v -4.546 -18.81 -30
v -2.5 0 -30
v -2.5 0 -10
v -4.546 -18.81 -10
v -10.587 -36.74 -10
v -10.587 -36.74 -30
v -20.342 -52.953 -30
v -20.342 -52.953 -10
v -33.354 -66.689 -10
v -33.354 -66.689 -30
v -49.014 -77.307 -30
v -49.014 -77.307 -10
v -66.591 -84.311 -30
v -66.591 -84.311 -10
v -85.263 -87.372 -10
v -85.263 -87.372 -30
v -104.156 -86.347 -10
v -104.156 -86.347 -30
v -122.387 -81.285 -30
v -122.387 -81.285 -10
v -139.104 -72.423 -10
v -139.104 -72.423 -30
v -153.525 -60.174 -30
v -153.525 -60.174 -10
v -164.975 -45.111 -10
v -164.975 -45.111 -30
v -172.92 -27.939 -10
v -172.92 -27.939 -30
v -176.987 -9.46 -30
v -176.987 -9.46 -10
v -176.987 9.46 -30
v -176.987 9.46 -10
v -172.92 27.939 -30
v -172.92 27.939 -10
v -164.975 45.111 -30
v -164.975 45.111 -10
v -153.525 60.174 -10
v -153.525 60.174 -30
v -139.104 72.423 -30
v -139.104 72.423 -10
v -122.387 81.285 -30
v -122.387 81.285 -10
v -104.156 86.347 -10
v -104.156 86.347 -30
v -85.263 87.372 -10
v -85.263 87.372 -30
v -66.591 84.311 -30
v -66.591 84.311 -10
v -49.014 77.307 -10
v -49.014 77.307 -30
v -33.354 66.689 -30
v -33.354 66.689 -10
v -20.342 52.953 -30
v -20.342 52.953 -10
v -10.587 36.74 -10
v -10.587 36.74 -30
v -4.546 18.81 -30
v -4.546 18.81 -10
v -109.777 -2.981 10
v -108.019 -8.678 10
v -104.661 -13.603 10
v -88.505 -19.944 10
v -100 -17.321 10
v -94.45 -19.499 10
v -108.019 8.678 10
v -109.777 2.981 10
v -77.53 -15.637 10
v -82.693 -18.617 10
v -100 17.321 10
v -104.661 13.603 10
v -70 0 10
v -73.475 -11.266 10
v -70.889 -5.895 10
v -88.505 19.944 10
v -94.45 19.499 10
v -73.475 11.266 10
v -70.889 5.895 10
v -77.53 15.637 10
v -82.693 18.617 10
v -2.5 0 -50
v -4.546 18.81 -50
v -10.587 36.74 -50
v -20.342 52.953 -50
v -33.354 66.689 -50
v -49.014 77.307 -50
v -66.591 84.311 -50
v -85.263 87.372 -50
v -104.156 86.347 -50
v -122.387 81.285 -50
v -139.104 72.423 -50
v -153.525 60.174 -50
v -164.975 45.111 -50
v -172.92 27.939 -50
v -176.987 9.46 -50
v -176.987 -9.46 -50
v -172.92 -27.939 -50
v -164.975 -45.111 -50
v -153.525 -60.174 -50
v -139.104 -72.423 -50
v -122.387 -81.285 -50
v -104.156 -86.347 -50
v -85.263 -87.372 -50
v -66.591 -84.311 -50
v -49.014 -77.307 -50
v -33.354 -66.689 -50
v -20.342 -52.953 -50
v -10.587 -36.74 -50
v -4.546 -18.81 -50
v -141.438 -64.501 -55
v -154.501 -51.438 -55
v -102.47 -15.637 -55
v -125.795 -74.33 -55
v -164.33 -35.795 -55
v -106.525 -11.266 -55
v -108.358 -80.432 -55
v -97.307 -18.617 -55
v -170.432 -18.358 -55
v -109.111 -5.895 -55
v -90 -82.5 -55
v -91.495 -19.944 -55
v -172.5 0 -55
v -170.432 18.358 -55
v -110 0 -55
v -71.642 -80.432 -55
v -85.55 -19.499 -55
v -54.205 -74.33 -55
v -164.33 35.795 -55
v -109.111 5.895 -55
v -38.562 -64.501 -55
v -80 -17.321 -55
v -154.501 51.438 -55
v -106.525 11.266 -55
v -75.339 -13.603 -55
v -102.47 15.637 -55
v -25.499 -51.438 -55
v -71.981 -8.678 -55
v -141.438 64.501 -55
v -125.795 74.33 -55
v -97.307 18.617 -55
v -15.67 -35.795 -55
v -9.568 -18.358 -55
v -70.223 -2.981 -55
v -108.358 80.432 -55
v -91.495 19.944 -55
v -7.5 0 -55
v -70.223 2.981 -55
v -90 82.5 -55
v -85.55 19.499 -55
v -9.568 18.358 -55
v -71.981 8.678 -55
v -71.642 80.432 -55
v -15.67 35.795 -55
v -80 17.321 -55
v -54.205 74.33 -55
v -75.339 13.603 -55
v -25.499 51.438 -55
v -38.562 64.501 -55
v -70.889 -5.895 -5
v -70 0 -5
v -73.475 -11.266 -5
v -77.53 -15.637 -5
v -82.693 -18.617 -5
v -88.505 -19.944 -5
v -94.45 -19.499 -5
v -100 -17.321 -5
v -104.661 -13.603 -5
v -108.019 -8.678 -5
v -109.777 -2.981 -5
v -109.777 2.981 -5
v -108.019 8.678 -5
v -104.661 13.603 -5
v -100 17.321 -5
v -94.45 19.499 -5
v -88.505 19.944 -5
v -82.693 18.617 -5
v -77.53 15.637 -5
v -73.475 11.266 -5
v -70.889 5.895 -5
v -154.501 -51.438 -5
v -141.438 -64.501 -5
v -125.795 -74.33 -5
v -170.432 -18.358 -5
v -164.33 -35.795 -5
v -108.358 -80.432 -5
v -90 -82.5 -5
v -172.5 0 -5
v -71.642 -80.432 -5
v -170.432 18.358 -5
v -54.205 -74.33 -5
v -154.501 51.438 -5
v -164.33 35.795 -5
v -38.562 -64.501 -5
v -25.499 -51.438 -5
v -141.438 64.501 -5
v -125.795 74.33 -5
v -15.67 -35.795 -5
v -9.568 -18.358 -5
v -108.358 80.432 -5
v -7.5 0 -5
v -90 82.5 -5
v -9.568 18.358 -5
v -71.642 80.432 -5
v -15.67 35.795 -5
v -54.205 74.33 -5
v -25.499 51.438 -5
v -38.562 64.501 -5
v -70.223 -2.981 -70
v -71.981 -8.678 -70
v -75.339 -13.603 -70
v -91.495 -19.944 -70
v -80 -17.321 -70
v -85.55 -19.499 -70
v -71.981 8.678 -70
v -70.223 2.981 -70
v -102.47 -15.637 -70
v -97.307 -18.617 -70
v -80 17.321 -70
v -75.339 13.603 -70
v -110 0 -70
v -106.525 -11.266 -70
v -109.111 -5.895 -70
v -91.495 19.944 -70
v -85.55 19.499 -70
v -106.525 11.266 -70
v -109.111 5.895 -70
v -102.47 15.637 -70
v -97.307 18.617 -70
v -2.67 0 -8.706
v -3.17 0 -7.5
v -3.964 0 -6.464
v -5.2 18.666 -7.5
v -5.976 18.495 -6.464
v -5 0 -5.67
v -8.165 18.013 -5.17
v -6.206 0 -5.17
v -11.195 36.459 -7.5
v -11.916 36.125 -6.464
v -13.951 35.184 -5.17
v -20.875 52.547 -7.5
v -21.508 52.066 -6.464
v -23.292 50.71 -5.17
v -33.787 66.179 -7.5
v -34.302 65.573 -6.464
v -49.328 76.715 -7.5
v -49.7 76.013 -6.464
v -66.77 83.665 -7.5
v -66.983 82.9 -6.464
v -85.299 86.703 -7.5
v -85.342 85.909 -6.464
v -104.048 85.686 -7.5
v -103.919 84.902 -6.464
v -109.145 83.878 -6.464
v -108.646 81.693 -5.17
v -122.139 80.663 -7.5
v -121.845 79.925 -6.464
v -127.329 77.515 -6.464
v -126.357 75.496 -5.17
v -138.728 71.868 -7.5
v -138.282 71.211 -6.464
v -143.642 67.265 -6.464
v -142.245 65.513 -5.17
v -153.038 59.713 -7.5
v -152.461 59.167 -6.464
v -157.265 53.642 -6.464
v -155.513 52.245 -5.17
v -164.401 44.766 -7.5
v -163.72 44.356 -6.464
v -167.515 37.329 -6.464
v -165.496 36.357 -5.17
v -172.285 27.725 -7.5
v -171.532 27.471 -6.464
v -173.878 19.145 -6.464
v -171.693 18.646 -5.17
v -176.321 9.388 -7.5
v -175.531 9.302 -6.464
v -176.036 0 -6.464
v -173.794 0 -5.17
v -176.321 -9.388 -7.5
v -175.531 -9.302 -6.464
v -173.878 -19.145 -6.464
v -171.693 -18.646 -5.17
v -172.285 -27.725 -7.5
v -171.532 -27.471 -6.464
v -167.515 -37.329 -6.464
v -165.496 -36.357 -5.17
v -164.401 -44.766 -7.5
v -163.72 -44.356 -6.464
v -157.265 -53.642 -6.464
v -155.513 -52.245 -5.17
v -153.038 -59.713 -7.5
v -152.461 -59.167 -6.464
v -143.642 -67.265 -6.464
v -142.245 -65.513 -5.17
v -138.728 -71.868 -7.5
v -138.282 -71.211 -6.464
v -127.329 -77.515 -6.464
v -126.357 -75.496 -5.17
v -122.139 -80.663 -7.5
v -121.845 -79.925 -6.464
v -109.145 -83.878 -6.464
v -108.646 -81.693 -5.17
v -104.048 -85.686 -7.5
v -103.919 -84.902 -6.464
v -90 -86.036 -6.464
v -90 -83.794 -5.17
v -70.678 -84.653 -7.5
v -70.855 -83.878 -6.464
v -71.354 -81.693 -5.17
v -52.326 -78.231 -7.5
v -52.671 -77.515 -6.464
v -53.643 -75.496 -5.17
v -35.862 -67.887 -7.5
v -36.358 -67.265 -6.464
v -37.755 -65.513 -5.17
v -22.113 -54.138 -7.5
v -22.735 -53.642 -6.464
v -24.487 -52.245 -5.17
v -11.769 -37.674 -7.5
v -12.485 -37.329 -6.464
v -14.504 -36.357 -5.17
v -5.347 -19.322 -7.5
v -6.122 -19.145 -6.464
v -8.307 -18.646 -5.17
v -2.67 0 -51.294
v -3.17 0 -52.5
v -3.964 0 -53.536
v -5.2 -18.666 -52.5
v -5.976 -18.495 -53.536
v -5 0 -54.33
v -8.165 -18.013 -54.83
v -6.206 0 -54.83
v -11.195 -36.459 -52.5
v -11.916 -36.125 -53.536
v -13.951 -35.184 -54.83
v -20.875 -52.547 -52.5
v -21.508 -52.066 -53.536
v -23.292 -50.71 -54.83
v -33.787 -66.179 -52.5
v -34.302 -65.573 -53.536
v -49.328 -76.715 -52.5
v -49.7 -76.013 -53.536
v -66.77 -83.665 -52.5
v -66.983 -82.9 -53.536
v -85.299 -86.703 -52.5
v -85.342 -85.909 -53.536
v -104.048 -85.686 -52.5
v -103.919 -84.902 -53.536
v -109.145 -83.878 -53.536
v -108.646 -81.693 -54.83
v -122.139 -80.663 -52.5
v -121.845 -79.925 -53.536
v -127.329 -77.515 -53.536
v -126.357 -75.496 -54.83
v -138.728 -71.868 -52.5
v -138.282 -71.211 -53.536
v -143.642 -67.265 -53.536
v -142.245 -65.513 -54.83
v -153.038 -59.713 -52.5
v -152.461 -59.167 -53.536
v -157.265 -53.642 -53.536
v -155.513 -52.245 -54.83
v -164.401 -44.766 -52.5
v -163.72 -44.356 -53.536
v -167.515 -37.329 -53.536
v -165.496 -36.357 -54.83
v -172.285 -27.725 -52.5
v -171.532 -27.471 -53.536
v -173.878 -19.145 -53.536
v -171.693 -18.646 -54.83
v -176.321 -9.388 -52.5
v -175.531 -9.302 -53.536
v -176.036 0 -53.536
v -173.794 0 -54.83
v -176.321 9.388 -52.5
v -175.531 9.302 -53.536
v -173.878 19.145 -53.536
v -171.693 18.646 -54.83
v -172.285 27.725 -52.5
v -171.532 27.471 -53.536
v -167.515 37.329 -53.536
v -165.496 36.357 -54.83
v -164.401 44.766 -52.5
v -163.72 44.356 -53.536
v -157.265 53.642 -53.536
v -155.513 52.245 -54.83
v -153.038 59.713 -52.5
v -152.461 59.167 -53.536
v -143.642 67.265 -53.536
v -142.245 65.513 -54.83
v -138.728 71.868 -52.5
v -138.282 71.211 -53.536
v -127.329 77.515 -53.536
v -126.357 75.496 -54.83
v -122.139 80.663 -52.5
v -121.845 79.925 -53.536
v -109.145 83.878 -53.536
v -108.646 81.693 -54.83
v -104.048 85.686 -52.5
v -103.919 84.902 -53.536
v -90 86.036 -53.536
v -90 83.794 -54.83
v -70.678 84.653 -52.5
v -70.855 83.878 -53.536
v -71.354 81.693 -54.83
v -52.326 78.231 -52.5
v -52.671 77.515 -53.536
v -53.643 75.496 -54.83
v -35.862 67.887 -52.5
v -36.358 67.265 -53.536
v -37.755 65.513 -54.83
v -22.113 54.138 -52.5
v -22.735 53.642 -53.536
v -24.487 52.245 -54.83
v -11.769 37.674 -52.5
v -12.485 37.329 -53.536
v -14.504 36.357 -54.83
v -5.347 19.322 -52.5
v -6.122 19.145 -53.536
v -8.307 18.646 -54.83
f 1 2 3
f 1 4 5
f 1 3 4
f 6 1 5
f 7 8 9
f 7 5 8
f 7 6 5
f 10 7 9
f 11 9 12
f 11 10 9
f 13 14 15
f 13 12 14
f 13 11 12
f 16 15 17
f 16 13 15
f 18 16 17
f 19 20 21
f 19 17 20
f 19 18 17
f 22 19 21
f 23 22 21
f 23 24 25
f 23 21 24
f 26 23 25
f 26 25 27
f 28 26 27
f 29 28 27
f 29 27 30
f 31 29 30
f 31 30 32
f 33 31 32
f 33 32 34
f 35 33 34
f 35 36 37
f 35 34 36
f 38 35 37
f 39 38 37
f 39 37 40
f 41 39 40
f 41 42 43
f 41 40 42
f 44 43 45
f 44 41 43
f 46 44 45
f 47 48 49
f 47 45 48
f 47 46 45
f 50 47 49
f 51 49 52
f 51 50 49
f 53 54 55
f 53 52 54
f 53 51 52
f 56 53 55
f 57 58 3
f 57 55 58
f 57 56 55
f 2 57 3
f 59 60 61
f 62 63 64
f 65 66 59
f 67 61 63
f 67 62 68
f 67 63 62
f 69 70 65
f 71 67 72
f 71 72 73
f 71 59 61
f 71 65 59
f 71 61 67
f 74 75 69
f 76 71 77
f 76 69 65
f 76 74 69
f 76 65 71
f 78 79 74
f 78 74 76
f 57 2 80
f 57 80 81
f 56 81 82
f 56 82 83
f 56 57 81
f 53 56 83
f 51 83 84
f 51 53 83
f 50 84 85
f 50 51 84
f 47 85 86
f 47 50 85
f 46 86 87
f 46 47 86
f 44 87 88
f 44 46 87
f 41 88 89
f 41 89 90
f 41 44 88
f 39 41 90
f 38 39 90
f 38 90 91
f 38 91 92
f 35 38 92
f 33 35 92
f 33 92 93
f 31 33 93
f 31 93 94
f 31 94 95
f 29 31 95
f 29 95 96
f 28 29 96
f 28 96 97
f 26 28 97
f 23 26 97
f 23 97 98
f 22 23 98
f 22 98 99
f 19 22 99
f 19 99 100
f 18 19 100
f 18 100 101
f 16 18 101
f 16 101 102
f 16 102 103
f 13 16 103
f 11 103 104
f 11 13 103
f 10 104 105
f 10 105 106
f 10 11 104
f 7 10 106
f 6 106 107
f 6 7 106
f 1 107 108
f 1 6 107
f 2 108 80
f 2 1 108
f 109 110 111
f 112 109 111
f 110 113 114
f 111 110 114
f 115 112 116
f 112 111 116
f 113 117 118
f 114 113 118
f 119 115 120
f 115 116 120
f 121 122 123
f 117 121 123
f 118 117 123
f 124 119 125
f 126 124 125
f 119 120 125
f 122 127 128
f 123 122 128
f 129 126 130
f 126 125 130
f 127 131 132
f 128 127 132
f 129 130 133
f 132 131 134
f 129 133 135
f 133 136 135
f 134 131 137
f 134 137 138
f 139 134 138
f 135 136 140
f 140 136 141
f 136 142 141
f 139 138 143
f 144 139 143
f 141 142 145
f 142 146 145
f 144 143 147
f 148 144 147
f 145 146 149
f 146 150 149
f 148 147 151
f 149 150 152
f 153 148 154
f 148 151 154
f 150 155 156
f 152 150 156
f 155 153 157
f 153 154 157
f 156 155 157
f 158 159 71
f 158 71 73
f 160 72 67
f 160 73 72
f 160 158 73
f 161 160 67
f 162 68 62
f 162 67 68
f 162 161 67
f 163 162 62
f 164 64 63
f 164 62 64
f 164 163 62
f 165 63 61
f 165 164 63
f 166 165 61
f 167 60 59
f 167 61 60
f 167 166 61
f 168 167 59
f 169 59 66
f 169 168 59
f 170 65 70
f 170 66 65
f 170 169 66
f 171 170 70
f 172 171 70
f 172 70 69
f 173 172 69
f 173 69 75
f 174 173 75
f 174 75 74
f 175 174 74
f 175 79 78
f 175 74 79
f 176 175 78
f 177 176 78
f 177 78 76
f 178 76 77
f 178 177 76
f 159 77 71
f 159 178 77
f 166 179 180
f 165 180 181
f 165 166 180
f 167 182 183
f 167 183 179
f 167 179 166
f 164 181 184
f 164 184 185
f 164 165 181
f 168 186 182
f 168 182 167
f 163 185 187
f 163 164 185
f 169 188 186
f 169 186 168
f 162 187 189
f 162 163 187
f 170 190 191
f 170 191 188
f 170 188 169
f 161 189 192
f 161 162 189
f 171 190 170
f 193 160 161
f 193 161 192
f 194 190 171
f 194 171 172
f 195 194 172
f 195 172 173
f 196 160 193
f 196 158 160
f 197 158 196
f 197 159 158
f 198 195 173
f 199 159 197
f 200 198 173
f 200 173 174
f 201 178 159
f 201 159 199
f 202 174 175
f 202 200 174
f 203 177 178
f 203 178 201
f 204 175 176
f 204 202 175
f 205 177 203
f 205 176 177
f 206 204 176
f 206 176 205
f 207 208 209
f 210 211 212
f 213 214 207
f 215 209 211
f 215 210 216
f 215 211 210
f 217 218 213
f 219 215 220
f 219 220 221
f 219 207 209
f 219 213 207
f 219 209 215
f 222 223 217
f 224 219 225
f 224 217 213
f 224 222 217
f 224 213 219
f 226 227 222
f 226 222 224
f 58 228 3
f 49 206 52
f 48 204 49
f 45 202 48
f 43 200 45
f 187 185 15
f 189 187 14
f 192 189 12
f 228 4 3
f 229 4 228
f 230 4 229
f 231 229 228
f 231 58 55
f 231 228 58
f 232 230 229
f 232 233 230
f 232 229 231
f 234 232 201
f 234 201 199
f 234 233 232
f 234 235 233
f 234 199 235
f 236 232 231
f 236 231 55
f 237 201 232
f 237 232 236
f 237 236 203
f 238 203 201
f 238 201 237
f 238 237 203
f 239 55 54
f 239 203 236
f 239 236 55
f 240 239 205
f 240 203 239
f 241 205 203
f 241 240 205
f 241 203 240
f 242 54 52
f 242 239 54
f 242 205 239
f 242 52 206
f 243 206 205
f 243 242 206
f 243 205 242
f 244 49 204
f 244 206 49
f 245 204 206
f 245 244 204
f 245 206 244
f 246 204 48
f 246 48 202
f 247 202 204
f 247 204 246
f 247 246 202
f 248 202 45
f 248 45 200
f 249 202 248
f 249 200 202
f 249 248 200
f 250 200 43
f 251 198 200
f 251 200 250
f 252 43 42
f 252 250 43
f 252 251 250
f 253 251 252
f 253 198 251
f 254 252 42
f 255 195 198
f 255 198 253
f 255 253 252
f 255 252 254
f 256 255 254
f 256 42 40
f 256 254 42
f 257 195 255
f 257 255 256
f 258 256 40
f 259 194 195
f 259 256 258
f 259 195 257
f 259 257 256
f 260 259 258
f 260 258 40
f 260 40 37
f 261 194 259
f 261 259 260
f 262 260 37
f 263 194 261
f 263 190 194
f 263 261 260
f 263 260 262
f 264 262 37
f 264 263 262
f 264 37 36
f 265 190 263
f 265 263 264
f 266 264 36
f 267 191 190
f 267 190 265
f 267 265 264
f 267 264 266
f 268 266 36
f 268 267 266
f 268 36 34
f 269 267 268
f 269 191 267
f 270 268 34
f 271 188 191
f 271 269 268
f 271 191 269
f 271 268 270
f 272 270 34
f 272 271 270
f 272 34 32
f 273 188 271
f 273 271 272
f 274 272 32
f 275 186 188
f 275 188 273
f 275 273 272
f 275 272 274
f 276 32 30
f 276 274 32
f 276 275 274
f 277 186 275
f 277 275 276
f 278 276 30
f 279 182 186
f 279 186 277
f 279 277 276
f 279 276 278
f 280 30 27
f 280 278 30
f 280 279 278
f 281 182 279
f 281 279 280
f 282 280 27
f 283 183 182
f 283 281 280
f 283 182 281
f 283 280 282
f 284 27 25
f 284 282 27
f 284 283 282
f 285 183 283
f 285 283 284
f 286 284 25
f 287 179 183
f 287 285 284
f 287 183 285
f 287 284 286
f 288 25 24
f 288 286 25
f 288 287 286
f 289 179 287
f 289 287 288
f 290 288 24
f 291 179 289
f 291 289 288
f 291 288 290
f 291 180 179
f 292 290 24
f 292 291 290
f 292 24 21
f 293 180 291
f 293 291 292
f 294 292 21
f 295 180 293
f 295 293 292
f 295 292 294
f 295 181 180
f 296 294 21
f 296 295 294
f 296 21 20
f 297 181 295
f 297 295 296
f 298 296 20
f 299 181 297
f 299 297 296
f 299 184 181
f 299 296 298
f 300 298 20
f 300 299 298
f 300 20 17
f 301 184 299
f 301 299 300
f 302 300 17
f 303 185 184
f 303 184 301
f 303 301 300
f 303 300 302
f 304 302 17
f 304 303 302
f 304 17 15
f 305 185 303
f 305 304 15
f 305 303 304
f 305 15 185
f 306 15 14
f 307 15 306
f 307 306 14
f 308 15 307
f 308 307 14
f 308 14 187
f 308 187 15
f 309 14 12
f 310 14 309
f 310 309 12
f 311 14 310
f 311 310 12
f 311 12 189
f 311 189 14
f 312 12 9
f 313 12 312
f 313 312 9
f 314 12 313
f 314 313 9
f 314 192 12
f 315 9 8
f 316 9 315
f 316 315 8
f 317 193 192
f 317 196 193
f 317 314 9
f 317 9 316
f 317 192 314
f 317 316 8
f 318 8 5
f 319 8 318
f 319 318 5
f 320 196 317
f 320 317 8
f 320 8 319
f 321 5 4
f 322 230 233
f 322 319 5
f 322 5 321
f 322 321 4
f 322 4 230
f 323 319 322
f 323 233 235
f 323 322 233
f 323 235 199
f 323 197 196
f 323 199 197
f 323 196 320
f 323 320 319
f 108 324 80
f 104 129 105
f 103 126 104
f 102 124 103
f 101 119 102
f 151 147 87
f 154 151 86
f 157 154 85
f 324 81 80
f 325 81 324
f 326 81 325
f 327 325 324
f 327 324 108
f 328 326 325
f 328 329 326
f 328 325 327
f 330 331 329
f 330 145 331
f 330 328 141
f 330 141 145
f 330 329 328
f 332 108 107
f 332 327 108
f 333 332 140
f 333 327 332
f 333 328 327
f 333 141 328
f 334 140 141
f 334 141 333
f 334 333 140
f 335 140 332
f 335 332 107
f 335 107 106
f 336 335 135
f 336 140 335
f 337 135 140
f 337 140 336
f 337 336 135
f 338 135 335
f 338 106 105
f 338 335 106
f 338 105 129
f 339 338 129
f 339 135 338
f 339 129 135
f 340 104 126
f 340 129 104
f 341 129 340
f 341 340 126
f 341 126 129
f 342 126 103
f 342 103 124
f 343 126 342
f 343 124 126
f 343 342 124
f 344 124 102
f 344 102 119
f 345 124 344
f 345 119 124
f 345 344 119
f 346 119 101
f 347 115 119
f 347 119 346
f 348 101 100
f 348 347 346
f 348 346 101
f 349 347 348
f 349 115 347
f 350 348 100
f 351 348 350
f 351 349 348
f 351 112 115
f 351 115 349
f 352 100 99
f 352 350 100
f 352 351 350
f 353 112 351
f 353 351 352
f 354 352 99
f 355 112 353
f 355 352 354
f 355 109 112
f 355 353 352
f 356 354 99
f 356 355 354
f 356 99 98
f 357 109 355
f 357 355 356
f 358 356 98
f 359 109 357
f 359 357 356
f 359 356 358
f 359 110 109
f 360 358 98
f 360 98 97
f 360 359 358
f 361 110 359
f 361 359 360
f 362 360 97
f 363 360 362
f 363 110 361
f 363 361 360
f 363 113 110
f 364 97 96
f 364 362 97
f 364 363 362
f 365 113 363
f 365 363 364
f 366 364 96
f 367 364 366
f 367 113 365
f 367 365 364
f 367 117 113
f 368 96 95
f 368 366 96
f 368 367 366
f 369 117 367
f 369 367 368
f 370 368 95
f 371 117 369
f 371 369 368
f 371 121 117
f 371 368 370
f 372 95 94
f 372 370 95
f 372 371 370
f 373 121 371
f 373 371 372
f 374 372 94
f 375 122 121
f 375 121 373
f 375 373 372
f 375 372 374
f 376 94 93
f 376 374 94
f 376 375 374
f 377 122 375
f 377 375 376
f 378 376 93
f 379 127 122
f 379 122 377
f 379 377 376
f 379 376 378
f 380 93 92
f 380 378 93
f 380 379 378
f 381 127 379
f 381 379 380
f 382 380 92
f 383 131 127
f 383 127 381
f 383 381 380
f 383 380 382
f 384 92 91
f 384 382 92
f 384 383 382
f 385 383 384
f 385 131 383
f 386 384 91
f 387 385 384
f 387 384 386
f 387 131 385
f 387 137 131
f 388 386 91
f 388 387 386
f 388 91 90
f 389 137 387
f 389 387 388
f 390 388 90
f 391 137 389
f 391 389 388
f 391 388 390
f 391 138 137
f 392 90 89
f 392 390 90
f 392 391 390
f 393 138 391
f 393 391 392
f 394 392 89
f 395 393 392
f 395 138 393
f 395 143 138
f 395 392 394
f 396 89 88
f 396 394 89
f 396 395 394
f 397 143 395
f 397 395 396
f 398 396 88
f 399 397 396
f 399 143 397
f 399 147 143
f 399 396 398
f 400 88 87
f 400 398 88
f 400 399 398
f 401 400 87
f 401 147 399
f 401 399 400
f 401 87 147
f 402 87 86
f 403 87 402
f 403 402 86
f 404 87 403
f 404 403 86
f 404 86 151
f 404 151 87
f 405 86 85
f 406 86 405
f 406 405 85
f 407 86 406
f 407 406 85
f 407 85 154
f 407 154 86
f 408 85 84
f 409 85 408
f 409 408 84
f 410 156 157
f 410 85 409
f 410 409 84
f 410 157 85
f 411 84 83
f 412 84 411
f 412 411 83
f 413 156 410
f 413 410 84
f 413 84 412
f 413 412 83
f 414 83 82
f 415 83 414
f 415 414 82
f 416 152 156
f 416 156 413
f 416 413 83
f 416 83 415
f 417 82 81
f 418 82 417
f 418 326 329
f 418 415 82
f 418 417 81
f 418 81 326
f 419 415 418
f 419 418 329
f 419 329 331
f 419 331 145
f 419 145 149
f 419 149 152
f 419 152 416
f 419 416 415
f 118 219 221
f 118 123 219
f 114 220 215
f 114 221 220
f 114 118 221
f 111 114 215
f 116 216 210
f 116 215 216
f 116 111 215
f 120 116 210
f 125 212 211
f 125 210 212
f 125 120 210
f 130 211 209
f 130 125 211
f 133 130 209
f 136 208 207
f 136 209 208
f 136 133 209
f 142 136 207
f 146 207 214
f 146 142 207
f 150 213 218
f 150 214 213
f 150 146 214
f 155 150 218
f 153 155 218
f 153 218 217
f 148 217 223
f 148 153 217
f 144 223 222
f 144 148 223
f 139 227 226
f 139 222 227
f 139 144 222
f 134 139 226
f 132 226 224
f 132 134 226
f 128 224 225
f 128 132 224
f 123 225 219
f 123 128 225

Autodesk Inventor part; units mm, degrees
ref_plane "YZ Plane" through (0, 0, 0) normal (1, 0, 0) x (0, 1, 0)
ref_plane "XZ Plane" through (0, 0, 0) normal (0, 1, 0) x (-1, 0, 0)
ref_plane "XY Plane" through (0, 0, 0) normal (0, 0, 1) x (1, 0, 0)
ref_plane "РабПлоскость3" through (0.0801, 60, -30) normal (0, 0, 1) x (1, 0, 0)
sketch "Эскиз1" plane through (0.0801, 60, -30) normal (0, 0, 1) x (1, 0, 0)
  line L0 (-0.0801, -60) -> (-90.0801, -60)
  circle A0 centre (-90.0801, -60) radius 87.5
  dimension "d0" = 90
  dimension "d1" = 175
extrude "Выдавливание1" add sketch "Эскиз1" along normal mid plane 50
sketch "Эскиз2" plane through (-90, 0, -5) normal (0, 0, 1) x (1, 0, 0)
  circle A0 centre (0, 0) radius 20
  point P0 (90, 0)
  dimension "d4" = 40
extrude "Выдавливание2" add sketch "Эскиз2" along normal blind 15
sketch "Эскиз3" plane through (-90, 0, -55) normal (0, 0, -1) x (-1, 0, 0)
  circle A0 centre (0, 0) radius 20 projected
  circle A1 centre (0, 0) radius 20
  point P0 (-90, 0)
  dimension "d7" = 40
extrude "Выдавливание3" add sketch "Эскиз3" along normal blind 15
fillet "Сопряжение1" radius 5 1 edges at (-177.5, 0, -5)
fillet "Сопряжение2" radius 5 1 edges at (-177.5, 0, -55)
properties part number "Колесо"
